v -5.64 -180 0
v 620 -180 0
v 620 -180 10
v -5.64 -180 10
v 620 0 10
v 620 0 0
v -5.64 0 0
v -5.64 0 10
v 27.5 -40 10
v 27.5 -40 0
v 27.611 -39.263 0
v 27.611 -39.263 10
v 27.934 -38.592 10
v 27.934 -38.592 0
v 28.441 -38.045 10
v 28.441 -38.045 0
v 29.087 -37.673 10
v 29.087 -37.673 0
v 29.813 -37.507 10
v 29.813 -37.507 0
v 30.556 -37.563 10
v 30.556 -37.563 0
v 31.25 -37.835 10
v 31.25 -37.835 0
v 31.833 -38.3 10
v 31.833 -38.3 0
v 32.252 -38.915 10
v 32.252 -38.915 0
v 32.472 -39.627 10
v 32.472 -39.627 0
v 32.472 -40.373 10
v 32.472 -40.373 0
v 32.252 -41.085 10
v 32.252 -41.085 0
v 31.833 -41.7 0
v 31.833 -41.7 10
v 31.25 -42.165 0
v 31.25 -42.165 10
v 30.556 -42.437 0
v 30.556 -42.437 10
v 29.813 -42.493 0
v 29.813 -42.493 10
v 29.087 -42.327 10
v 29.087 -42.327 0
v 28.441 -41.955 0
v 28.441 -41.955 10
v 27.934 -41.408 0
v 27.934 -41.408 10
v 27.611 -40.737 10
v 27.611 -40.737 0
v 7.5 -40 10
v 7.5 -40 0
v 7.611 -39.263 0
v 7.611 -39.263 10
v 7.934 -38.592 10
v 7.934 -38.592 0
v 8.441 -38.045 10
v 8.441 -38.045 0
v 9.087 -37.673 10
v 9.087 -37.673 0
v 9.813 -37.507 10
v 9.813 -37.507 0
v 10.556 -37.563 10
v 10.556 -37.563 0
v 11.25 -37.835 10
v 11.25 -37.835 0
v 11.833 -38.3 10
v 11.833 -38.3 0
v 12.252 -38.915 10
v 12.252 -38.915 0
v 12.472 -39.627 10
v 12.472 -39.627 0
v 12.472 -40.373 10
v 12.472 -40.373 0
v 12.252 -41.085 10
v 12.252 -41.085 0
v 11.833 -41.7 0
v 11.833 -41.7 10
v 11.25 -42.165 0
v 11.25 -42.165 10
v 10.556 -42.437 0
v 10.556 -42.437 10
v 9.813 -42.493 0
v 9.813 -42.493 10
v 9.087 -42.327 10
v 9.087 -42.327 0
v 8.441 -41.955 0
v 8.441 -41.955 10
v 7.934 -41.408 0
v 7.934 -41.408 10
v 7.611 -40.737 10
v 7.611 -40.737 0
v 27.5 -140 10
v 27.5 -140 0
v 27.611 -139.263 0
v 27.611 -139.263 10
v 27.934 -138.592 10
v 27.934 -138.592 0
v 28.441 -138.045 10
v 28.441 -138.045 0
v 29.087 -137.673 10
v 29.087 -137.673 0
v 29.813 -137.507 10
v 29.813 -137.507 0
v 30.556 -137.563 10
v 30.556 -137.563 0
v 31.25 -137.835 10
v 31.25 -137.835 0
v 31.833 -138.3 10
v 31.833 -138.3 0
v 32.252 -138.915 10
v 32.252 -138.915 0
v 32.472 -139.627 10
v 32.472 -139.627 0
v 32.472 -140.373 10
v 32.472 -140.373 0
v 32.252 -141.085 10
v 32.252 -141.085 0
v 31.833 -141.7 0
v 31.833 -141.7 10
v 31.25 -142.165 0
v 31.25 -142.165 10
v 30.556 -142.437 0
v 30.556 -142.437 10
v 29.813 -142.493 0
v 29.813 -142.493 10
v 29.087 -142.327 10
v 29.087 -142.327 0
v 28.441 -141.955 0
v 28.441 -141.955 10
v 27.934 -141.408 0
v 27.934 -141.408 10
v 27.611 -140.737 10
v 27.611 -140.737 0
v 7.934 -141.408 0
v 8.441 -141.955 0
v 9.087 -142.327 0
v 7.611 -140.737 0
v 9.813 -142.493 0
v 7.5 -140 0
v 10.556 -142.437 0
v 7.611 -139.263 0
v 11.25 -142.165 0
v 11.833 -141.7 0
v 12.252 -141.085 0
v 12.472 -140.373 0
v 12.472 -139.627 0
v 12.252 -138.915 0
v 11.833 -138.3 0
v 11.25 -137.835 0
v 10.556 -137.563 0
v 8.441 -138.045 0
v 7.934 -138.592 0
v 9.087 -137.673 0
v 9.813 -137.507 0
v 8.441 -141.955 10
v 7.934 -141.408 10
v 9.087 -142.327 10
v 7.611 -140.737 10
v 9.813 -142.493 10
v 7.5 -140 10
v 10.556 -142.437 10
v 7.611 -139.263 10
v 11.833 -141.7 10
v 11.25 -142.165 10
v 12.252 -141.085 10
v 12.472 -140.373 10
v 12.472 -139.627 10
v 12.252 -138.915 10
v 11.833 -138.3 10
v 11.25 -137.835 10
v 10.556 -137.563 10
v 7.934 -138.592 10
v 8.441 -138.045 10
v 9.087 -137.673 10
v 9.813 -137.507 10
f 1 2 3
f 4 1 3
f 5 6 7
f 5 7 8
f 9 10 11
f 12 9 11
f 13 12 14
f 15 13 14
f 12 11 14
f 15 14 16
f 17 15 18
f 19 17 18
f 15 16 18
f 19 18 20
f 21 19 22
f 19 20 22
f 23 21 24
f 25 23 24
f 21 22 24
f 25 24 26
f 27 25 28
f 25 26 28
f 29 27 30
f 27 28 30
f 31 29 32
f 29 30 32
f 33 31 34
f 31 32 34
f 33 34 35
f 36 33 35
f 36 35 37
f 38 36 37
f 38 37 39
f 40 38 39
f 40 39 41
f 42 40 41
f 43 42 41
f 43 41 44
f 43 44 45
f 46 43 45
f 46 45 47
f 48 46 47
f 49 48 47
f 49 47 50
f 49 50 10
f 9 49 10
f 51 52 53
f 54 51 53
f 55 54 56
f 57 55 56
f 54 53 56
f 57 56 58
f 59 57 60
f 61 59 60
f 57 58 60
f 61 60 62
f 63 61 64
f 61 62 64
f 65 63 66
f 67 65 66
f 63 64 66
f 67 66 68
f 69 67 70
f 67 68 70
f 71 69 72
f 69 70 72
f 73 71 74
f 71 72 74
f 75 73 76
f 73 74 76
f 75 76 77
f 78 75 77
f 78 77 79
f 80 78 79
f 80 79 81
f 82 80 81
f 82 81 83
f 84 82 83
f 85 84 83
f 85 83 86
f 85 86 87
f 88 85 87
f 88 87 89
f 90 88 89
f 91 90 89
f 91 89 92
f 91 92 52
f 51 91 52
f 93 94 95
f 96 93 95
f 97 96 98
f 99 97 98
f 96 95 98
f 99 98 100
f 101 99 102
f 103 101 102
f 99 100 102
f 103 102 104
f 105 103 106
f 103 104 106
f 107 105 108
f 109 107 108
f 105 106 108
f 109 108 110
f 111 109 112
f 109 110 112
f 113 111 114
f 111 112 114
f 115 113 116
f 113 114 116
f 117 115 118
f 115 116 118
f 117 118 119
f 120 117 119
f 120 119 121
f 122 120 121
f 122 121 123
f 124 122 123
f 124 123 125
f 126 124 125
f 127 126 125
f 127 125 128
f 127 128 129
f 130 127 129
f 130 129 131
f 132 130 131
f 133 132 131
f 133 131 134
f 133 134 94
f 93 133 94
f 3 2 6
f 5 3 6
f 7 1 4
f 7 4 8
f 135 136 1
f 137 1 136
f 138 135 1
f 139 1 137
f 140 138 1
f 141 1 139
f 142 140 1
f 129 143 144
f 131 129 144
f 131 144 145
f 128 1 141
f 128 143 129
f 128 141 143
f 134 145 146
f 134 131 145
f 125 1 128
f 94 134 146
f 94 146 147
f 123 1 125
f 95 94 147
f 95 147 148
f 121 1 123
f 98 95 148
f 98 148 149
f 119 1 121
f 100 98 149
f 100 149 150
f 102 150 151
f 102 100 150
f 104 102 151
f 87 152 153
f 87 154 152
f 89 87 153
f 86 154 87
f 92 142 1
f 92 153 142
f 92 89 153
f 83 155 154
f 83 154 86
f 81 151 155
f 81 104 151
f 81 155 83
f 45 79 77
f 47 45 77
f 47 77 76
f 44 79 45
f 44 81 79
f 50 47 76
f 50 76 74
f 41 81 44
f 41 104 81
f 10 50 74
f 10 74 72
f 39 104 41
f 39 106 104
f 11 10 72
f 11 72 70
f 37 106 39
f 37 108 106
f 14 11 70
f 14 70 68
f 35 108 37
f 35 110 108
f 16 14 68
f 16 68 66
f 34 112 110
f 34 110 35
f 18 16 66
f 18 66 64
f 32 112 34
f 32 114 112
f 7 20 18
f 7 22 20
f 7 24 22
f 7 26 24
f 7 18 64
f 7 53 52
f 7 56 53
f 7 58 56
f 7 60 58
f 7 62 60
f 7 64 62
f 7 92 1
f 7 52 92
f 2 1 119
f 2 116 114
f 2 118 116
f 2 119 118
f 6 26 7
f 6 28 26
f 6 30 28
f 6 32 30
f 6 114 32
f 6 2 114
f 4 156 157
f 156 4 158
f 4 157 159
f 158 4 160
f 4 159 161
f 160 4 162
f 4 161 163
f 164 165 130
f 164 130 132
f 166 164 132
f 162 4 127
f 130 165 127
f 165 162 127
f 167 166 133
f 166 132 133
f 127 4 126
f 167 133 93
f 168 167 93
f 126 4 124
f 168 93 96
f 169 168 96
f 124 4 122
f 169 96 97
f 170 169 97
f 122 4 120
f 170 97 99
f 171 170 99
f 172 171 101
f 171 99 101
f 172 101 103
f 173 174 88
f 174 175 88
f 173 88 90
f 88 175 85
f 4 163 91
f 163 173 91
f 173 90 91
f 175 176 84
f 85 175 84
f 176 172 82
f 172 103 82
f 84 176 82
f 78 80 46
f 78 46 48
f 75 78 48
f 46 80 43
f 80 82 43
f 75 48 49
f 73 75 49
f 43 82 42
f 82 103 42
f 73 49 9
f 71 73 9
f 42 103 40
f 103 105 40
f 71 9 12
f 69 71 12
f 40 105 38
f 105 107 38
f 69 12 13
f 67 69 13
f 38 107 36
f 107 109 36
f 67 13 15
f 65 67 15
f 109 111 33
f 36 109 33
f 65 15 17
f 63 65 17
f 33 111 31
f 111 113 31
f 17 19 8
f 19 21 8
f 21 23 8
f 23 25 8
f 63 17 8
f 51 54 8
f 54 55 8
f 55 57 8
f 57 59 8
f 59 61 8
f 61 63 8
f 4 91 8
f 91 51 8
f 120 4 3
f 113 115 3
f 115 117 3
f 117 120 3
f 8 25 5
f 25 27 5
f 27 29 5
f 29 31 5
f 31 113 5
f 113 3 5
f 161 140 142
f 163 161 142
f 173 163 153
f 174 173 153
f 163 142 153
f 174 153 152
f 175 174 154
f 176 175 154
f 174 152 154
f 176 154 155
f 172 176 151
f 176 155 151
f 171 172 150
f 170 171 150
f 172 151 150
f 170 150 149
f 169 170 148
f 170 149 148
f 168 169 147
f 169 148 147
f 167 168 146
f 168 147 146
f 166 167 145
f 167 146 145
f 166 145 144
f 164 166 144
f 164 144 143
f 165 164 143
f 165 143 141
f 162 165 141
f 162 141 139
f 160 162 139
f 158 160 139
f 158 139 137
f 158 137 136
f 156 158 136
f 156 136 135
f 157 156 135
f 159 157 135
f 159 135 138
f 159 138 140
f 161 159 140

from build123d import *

# Parameters (mm, degrees)
F0_W     = 620
F0_H     = 180
F1_DEPTH = 10
F3_D     = 5
F3_DEPTH = 11
F3_TIP   = 1.5021515476
F4_DEPTH = 5.64


with BuildPart() as f1:
    # F0 (on Top) → F1 (new body)
    with BuildSketch(Plane.XY):
        with Locations((310, -90)):
            Rectangle(F0_W, F0_H)
    extrude(amount=F1_DEPTH)

    # F3
    with Locations(Plane.XY.offset(10)):
        with Locations((10, -40), (30, -40), (10, -140), (30, -140)):
            Hole(F3_D / 2, depth=F3_DEPTH)
            with Locations((0, 0, -(F3_DEPTH + F3_TIP / 2))):  # 118° drill point
                Cone(0, F3_D / 2, F3_TIP, mode=Mode.SUBTRACT)

    # F4 (add): a face of the model
    f4_faces = [f1.faces().sort_by_distance(p)[0] for p in [
        (0, -90, 5),
    ]]
    extrude(f4_faces, amount=F4_DEPTH)


solid = f1.part
